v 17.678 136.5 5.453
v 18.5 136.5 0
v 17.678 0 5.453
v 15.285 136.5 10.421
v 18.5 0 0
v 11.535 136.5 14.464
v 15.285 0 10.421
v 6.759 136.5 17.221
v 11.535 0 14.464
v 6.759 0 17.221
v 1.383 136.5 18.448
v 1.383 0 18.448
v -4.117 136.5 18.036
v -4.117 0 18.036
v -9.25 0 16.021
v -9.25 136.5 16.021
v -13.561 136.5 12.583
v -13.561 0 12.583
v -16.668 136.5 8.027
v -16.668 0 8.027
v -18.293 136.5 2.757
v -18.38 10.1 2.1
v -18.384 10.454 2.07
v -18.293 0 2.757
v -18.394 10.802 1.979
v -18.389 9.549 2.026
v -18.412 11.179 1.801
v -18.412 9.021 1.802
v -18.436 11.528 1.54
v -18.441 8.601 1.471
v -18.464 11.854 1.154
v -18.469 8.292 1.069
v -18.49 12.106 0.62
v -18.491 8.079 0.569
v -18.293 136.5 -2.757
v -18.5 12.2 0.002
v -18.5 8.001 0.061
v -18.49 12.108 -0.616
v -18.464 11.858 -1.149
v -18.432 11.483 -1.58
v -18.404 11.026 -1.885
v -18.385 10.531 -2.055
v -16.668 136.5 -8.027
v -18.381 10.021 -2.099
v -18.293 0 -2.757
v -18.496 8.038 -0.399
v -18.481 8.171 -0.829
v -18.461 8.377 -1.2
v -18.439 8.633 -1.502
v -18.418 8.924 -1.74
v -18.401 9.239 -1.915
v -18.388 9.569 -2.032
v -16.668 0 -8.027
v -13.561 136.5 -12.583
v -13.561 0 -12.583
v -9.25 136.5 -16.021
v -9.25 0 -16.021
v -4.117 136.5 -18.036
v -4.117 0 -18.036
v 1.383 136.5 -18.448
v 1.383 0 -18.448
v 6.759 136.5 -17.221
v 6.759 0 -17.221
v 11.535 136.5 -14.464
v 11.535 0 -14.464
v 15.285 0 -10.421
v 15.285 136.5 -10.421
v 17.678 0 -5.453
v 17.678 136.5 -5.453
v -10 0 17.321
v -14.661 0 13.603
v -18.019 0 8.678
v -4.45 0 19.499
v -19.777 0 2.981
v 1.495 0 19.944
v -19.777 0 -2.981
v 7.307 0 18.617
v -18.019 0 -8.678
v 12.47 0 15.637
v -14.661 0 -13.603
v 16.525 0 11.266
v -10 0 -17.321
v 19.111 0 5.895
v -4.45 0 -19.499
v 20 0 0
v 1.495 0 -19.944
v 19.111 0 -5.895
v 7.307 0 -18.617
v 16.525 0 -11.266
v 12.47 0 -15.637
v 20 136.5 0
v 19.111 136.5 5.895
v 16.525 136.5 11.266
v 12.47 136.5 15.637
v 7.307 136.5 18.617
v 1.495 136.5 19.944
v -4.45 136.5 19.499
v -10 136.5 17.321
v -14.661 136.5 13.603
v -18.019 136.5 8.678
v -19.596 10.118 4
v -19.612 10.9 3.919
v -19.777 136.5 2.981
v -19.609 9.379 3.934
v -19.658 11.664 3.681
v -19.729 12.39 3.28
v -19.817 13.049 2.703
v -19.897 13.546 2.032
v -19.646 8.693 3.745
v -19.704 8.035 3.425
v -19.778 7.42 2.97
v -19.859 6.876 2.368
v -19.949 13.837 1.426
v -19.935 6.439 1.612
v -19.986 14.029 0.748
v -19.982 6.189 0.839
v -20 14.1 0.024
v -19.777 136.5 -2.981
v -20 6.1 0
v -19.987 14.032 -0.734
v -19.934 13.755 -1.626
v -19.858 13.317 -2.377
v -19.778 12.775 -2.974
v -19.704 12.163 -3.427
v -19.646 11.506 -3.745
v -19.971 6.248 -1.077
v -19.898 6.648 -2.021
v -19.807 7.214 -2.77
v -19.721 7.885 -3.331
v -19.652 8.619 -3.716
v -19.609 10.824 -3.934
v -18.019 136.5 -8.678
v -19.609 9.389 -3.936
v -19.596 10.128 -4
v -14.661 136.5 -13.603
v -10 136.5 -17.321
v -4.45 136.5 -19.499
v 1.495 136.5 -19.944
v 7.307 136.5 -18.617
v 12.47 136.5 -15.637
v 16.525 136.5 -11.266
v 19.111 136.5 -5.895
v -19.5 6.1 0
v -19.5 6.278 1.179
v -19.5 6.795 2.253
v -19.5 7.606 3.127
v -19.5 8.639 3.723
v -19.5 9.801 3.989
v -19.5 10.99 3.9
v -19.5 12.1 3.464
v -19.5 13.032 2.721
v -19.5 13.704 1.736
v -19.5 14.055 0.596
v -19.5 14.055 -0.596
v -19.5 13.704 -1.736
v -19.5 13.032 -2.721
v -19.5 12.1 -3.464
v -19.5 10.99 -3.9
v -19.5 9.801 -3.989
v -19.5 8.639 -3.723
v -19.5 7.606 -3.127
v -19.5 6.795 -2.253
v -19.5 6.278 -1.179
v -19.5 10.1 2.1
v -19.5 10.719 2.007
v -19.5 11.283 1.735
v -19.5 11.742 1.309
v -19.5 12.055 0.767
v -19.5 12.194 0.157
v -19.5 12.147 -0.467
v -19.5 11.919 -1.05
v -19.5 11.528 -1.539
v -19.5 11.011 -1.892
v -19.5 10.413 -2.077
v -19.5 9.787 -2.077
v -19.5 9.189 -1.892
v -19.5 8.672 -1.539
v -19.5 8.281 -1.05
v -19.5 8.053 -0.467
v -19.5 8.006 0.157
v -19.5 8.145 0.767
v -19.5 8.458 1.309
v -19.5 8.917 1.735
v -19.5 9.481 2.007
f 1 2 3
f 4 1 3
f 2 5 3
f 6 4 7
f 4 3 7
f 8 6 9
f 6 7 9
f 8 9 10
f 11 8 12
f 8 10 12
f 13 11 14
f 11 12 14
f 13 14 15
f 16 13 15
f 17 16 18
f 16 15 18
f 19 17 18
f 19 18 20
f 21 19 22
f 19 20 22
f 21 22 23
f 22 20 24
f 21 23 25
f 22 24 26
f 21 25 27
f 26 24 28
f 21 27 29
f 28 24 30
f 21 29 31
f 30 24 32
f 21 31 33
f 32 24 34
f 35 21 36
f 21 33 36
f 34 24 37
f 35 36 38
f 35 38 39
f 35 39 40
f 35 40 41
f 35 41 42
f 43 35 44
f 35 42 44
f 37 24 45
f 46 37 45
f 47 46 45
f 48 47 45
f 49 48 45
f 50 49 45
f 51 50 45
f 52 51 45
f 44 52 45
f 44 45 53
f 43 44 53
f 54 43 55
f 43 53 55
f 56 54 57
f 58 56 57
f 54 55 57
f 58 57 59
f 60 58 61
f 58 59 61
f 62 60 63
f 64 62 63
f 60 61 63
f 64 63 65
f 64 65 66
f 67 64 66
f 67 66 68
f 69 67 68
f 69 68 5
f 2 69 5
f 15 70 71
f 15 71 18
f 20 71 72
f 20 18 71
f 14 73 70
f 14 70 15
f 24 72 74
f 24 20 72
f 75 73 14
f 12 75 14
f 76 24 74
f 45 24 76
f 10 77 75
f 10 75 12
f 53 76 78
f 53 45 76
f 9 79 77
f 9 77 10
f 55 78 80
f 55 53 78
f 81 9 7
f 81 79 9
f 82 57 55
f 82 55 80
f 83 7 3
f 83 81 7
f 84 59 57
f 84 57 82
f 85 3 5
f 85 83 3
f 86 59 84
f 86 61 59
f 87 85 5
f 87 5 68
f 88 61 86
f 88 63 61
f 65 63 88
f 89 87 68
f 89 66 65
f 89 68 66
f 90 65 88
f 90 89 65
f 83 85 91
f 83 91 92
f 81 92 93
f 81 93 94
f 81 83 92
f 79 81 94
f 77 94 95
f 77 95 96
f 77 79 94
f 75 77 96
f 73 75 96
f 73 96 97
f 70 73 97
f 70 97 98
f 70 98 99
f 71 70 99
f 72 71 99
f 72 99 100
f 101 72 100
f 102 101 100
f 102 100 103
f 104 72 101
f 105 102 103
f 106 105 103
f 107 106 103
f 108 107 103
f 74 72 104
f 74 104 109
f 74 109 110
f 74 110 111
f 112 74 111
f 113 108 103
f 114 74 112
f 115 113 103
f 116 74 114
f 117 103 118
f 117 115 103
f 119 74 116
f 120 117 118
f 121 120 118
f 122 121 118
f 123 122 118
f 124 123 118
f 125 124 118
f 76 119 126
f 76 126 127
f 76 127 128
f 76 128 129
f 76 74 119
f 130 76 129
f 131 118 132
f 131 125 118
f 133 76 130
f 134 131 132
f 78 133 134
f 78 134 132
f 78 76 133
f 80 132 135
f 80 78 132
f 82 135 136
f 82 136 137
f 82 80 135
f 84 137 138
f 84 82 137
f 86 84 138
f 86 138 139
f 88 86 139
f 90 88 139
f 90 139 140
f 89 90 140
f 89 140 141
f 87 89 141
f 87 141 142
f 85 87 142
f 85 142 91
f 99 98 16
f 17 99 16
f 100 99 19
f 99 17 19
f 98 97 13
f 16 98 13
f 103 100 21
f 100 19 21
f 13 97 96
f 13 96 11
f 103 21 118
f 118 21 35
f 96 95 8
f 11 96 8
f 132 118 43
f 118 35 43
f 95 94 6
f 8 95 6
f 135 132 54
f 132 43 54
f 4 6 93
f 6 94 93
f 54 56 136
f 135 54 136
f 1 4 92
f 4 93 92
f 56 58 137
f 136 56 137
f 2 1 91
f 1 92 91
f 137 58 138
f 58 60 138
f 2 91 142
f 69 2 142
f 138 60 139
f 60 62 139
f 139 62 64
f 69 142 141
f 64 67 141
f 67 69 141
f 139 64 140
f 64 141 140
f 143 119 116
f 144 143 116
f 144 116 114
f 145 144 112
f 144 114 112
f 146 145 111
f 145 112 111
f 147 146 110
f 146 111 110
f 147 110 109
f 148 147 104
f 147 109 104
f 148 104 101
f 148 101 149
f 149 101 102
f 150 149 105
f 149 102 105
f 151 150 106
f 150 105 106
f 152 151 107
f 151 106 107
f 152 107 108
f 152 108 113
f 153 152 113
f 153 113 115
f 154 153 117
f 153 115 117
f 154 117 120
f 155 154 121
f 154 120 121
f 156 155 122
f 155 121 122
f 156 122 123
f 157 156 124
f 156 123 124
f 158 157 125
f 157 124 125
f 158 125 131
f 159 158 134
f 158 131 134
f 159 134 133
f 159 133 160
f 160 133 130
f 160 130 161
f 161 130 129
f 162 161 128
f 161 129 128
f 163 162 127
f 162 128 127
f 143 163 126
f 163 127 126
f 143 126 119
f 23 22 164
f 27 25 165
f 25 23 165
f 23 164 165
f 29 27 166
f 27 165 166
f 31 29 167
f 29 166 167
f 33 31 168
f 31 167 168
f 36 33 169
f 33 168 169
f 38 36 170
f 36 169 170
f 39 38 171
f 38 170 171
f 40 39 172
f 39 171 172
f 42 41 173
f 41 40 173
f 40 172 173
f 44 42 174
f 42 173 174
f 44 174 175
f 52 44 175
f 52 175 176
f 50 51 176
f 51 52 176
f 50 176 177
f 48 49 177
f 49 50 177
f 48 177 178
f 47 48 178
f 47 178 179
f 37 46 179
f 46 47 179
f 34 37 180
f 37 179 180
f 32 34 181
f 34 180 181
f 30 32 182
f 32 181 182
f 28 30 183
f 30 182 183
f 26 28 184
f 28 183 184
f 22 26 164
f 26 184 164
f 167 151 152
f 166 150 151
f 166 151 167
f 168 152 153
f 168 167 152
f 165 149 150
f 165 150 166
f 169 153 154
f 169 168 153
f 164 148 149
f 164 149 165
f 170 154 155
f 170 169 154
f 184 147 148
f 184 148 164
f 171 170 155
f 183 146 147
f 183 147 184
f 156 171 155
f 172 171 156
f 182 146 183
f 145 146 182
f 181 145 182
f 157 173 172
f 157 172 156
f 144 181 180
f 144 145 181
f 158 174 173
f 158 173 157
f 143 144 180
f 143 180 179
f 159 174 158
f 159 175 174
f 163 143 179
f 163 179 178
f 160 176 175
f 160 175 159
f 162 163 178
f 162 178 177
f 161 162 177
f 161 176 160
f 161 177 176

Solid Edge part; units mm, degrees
sketch "Sketch1" plane through (0, 0, 0) normal (0, -1, 0) x (1, 0, 0)
  circle A0 centre (0, 0) radius 18.5
  circle A1 centre (0, 0) radius 20
extrude "Extrusionsausprägung_1" add sketch "Sketch1" against normal blind 136.5
hole "Bohrung_1" at (-20, 10.1, 0) direction (1, 0, 0) diameter 4.2 end up to next
sketch "Sketch2" plane through (-20, 68.25, 0) normal (-1, 0, 0) x (0, -1, 0)
  circle A0 centre (58.15, 0) radius 4
extrude "Extrusionsausschnitt_1" cut sketch "Sketch2" against normal blind 0.5
properties material "Acryl, hoher Anschlag"
